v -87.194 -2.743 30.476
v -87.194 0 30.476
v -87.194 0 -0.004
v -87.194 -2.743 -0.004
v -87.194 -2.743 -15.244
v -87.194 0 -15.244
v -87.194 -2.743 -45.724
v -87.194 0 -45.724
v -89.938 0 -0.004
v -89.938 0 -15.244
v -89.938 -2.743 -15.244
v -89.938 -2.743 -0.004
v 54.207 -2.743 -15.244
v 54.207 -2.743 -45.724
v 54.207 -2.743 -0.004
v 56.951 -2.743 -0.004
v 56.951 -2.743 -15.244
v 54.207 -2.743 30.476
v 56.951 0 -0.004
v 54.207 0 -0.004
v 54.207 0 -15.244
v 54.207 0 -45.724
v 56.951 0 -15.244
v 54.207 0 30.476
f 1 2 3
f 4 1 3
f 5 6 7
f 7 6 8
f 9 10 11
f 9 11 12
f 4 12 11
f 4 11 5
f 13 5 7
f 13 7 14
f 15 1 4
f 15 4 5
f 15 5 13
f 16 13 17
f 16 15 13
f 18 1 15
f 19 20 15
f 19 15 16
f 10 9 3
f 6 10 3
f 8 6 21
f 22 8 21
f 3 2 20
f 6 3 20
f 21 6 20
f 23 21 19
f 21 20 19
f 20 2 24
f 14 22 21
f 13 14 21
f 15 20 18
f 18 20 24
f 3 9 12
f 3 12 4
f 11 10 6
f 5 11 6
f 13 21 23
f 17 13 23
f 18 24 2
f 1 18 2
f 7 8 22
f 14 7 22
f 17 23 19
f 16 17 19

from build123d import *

# Parameters (mm, degrees)
F0_W     = 2.7432
F0_H     = 15.24
F0_W_2   = 15.24
F0_H_2   = 2.7432
F1_DEPTH = 2.7432


# Not quite as in the source:
# - a feature names something its author has since deleted; it is built from what else it names


with BuildPart() as f1:
    # F0 (on Front) → F1 (new body)
    with BuildSketch(Plane.XZ):
        Polygon((-24.1134765283, 30.4756419325), (-87.1943765283, 30.4756419325), (-87.1943765283, -0.0043580675), (-87.1943765283, -15.2443580675), (-87.1943765283, -45.7243580675), (-24.1134765283, -45.7243580675), (-24.1134765283, -42.9811580675), (-8.8734765283, -42.9811580675), (-8.8734765283, -45.7243580675), (54.2074234717, -45.7243580675), (54.2074234717, -15.2443580675), (54.2074234717, -0.0043580675), (54.2074234717, 30.4756419325), (-8.8734765283, 30.4756419325), (-8.8734765283, 27.7324419325), (-24.1134765283, 27.7324419325), align=None)
        with Locations((-88.5659765283, -7.6243580675)):
            Rectangle(F0_W, F0_H)
        with Locations((55.5790234717, -7.6243580675)):
            Rectangle(F0_W, F0_H)
        with Locations((-16.4934765283, 29.1040419325)):
            Rectangle(F0_W_2, F0_H_2)
        with Locations((-16.4934765283, -44.3527580675)):
            Rectangle(F0_W_2, F0_H_2)
    extrude(amount=F1_DEPTH)


solid = f1.part
